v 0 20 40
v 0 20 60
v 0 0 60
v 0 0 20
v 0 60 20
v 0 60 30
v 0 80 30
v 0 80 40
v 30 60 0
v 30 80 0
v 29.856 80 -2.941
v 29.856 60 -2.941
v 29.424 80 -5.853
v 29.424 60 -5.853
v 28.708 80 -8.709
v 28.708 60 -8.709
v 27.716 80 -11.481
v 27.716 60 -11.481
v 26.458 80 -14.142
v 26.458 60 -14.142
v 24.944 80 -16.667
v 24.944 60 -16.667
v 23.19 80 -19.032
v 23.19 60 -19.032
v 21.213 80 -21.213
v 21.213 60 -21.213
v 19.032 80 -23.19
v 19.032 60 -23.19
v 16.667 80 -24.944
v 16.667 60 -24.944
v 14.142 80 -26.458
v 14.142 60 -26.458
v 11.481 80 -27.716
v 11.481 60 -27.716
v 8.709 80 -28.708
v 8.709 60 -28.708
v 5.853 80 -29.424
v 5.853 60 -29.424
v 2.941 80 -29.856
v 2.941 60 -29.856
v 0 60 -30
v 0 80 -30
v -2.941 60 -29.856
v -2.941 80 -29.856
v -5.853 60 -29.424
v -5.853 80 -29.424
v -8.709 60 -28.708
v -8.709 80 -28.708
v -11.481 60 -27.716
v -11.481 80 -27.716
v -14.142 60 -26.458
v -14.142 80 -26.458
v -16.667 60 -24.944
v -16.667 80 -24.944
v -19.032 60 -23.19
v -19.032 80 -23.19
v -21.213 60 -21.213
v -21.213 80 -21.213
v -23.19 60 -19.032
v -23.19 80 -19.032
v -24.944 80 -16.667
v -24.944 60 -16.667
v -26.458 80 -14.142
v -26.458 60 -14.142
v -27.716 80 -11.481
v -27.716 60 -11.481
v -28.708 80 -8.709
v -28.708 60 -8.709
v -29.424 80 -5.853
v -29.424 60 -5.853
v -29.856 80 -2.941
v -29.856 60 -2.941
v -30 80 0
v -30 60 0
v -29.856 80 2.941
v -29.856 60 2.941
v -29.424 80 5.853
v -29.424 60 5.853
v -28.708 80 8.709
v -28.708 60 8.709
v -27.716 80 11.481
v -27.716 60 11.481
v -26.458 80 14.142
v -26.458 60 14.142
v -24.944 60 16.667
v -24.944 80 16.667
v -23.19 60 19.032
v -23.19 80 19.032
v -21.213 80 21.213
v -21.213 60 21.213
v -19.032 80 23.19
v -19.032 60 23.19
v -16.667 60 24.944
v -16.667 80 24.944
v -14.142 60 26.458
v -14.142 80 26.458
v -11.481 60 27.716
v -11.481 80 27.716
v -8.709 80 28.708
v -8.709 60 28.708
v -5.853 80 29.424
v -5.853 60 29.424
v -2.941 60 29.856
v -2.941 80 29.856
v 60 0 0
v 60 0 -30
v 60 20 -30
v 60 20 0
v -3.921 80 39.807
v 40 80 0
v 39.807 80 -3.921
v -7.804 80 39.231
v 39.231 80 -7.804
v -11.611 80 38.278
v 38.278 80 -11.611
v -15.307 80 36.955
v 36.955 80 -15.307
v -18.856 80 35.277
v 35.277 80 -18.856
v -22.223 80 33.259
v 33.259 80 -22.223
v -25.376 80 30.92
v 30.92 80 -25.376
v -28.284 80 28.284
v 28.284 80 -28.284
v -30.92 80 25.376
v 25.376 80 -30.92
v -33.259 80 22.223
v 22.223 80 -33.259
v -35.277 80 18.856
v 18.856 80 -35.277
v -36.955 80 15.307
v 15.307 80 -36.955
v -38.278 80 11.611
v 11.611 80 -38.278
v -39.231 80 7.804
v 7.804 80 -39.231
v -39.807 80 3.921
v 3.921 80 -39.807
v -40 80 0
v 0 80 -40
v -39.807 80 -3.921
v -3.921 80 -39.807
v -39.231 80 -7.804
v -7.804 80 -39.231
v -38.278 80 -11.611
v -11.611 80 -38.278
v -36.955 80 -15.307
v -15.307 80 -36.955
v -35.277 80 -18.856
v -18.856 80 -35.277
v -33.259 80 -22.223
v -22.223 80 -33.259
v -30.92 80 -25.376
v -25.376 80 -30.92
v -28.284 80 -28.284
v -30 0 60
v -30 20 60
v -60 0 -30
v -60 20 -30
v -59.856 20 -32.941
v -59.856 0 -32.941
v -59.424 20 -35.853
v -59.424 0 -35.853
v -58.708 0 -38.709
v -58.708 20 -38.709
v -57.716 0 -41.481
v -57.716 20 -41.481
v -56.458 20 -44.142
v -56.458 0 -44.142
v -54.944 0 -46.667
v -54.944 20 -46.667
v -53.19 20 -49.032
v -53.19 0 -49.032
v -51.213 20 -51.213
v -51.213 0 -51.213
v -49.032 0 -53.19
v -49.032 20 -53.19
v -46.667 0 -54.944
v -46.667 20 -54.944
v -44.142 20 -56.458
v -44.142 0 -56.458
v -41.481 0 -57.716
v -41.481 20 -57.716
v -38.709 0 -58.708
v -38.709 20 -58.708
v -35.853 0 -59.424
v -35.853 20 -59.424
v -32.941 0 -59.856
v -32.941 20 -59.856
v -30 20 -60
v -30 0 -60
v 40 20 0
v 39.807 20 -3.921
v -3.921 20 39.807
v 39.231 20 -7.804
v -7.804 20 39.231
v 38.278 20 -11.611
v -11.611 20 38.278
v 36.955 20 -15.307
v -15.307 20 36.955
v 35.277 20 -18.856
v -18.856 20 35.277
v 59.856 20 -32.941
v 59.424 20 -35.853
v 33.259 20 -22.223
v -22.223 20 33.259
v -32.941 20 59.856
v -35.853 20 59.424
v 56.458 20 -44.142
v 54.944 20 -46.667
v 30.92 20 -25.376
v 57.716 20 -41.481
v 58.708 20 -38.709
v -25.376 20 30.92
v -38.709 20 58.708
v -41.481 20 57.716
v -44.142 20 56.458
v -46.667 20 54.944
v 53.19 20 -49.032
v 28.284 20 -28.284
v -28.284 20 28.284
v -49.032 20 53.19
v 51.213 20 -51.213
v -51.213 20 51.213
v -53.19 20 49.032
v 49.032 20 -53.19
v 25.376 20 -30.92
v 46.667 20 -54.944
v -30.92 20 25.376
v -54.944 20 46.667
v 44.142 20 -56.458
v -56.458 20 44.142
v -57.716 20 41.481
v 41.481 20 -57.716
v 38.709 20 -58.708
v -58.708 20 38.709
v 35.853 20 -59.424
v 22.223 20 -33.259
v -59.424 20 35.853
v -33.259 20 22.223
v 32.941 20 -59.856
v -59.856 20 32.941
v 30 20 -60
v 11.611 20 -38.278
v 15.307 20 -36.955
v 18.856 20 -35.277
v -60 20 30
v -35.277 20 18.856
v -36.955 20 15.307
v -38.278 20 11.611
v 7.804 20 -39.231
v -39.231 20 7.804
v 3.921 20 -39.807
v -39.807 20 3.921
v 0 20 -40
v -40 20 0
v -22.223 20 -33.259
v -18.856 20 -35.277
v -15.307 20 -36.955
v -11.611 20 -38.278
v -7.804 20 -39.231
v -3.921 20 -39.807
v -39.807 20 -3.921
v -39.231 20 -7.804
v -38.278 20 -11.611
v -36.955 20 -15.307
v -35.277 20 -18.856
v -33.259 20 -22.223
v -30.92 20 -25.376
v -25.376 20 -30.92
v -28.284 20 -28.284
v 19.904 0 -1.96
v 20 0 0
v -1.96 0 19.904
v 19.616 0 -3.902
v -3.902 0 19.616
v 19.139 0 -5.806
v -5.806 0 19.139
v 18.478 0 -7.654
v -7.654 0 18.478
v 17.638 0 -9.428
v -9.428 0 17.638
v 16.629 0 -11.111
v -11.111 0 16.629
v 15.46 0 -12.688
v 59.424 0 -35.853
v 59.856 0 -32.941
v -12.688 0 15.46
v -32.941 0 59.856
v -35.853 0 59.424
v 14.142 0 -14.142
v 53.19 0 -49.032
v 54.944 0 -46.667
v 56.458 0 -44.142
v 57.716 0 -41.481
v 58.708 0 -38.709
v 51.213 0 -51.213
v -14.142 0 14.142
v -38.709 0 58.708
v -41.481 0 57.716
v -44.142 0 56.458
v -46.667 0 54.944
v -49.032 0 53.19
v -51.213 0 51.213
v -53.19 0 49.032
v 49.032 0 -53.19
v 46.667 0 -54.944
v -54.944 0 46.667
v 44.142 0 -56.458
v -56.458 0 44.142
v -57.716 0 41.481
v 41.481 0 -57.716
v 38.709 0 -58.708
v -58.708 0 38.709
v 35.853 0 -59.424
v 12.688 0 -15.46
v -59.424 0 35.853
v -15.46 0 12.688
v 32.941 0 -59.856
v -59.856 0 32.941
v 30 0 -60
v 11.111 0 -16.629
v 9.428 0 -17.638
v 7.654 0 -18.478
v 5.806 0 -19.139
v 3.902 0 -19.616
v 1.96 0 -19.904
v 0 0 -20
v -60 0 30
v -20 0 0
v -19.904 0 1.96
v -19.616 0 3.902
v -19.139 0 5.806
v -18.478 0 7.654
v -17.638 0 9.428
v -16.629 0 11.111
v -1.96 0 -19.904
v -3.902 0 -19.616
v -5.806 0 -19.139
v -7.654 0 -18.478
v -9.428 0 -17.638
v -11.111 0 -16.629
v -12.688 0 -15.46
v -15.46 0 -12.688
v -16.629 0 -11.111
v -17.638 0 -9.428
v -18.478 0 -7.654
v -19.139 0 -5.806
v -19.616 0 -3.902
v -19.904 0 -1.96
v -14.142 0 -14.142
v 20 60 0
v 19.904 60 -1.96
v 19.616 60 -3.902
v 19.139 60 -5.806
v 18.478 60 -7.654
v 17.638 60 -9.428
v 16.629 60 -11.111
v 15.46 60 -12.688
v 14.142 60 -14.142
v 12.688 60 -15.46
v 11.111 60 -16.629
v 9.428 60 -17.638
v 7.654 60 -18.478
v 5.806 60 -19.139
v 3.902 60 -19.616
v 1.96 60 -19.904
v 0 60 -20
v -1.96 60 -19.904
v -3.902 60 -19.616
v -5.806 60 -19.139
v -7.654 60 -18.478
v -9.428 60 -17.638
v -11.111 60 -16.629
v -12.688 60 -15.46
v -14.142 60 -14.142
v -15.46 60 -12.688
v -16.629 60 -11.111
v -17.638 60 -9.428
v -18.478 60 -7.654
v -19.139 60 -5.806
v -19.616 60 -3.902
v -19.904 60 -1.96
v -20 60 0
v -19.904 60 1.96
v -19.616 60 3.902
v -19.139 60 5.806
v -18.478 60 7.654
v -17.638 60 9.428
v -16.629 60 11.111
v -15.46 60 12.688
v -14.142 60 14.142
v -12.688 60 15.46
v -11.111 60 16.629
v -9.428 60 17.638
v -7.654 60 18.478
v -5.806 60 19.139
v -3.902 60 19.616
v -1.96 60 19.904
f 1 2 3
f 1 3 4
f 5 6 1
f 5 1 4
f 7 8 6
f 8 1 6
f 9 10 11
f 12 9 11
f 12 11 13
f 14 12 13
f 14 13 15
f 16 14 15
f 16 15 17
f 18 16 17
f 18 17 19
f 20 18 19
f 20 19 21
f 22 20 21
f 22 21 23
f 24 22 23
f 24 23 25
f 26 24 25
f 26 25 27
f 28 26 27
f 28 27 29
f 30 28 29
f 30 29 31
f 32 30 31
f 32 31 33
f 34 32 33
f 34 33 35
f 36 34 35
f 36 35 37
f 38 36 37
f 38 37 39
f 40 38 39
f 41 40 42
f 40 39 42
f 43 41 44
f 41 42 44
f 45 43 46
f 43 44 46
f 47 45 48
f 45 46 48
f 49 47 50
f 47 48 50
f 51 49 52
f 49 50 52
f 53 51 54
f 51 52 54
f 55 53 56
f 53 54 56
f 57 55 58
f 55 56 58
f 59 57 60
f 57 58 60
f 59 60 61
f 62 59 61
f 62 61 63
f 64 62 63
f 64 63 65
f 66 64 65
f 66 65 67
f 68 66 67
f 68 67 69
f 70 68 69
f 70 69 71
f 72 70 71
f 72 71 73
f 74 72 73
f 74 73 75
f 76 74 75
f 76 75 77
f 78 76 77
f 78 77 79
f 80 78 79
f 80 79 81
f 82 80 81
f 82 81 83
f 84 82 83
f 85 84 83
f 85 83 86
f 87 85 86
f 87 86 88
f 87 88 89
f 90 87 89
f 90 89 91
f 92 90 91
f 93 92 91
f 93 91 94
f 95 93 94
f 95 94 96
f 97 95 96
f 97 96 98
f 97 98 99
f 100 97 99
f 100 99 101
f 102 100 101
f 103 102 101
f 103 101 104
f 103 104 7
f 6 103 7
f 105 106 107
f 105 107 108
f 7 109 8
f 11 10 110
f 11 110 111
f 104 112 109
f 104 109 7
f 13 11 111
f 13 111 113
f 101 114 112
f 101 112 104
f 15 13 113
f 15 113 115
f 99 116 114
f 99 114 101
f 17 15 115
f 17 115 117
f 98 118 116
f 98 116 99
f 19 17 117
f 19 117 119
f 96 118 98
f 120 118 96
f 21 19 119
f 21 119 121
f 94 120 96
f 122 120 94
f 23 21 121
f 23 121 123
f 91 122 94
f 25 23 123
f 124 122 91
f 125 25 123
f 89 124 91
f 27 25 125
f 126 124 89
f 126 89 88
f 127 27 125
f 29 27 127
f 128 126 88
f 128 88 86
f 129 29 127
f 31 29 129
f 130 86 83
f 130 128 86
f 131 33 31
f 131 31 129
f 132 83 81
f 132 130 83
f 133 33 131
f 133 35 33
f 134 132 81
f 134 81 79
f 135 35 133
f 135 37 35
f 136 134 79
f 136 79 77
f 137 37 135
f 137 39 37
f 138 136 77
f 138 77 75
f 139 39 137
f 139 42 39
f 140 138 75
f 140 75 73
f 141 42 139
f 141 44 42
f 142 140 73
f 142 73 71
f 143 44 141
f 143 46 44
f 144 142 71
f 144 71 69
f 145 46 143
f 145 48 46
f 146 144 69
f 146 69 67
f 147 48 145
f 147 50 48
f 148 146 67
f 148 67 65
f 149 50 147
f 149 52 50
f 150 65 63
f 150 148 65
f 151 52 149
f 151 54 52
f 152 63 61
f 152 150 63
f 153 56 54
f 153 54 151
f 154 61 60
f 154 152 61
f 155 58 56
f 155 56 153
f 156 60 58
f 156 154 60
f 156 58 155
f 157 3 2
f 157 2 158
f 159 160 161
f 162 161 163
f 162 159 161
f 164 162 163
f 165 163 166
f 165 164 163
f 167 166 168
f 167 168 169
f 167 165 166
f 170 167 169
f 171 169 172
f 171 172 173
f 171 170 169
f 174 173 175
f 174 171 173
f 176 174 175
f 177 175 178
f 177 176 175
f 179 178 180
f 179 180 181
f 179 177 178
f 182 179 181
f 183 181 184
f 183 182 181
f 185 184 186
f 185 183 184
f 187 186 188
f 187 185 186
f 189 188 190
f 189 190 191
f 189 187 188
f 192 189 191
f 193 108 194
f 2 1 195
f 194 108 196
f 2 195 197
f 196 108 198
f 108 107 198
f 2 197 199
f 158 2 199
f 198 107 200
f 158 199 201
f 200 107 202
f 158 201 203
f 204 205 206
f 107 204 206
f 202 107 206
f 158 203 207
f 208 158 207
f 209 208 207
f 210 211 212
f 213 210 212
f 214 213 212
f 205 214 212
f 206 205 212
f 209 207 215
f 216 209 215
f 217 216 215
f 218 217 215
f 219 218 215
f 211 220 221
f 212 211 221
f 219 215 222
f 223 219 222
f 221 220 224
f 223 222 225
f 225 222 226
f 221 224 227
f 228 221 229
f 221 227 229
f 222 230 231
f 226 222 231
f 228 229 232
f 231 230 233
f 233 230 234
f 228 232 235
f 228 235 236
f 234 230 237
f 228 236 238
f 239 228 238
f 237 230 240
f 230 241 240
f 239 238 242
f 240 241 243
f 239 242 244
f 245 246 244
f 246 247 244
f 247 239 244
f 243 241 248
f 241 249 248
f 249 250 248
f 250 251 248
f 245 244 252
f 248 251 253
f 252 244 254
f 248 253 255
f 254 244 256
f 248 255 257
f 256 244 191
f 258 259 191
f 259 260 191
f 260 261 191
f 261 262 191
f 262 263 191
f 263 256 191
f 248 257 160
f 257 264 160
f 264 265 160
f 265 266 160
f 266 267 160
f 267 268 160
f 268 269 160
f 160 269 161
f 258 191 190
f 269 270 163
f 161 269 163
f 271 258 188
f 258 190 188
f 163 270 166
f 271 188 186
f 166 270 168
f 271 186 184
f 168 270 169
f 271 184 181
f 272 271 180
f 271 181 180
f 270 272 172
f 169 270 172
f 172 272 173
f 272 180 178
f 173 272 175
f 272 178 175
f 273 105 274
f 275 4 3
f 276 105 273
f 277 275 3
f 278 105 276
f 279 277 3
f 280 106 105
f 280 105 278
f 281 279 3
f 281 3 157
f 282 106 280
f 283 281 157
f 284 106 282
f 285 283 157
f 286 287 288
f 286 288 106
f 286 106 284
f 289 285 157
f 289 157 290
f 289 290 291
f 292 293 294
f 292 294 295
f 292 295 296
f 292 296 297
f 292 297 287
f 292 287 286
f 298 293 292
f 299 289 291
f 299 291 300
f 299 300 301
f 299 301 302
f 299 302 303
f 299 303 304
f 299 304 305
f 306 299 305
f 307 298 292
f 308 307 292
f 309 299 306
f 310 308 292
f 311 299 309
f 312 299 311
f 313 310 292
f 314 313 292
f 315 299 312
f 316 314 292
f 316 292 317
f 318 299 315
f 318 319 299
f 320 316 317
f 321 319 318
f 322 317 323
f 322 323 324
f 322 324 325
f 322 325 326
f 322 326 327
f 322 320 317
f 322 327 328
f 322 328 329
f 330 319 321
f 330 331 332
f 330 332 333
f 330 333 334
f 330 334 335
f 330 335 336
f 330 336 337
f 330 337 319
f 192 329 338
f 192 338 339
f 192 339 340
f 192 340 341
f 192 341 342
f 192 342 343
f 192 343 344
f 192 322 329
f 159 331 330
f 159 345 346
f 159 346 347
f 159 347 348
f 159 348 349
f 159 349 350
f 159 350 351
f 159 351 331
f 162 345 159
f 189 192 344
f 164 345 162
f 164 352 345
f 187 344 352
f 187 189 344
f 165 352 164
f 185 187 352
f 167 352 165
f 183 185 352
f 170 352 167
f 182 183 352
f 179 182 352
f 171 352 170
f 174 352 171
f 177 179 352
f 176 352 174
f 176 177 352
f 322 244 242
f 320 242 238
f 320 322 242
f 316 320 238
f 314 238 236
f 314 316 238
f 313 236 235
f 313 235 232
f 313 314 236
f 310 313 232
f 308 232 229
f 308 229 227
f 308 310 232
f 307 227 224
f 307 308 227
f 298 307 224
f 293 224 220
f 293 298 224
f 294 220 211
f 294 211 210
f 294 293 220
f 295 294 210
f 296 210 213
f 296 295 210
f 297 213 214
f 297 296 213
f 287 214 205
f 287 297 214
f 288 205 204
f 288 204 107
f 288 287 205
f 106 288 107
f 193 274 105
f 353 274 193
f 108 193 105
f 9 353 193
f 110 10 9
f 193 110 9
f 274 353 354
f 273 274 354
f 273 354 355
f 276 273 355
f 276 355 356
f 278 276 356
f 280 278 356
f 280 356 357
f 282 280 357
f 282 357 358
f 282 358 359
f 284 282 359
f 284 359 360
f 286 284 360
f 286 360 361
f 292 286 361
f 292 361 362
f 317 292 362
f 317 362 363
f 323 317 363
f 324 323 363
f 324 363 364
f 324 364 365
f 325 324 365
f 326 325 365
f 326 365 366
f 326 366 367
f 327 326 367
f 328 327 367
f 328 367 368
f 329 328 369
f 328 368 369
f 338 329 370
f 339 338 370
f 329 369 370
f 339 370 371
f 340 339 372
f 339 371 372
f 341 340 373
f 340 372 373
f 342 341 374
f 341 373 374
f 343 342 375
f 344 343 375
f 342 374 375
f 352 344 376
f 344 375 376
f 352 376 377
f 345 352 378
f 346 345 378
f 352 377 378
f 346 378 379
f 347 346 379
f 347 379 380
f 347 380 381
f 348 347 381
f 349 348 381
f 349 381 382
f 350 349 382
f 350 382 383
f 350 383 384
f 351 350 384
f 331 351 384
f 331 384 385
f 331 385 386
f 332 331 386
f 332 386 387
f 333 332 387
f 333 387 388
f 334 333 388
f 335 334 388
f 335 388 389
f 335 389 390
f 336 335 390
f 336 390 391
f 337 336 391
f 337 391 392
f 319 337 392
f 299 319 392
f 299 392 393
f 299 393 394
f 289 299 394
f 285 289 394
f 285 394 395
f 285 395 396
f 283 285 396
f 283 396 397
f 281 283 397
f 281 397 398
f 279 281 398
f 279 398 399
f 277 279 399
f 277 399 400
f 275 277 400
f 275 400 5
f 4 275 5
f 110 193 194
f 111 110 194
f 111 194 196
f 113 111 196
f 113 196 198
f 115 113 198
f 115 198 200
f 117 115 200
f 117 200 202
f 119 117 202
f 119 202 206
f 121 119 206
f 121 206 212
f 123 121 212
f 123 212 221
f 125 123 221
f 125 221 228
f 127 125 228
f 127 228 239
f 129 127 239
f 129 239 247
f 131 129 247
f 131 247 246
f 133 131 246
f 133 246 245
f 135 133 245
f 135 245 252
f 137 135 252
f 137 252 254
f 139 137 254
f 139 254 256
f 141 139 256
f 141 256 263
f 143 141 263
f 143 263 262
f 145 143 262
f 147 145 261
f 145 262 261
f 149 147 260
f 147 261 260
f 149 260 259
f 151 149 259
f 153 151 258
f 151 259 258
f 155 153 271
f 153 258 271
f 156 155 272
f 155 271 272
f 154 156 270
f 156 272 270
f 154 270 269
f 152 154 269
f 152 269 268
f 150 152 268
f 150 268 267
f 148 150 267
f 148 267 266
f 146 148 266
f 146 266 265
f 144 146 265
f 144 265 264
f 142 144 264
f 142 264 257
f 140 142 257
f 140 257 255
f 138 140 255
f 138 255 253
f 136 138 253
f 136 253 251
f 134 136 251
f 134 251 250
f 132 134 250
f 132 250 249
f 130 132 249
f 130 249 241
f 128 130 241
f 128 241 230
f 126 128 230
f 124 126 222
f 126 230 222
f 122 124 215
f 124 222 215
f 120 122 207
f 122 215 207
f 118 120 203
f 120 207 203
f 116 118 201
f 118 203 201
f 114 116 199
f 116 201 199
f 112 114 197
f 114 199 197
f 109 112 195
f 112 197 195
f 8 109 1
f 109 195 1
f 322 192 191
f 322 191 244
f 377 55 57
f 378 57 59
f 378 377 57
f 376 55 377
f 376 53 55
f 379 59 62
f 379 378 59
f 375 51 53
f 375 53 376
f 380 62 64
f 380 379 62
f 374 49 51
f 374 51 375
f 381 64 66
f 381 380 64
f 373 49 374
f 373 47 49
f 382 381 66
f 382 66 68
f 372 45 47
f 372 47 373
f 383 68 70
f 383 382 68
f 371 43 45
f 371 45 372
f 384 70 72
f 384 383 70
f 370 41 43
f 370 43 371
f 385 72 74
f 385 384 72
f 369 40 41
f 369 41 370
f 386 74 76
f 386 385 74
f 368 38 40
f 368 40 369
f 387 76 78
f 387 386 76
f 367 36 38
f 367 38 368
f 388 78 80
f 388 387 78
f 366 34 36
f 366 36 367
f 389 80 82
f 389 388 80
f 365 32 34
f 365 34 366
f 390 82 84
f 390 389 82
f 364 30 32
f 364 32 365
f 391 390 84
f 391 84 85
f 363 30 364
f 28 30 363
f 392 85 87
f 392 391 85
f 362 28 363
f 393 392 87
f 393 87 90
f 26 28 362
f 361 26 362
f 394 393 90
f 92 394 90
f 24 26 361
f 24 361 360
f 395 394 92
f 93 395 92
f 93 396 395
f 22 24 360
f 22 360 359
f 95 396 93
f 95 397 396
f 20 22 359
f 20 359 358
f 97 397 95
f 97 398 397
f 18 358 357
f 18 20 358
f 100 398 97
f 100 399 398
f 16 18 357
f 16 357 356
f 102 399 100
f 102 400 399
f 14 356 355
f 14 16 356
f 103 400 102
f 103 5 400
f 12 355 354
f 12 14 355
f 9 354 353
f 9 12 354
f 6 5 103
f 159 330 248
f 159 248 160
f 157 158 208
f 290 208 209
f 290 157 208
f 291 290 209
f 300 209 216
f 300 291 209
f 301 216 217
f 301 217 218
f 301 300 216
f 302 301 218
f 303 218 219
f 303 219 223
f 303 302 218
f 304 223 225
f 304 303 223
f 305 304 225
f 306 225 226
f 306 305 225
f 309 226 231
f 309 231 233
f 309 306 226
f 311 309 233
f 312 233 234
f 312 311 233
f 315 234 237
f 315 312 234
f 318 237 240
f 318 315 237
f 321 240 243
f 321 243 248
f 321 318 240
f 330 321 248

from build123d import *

# Parameters (mm, degrees)
SALIENTE_EXTRUIR1_DEPTH = 20
CROQUIS2_R              = 40
SALIENTE_EXTRUIR2_DEPTH = 60
CROQUIS3_R              = 30
CORTAR_EXTRUIR1_DEPTH   = 20
CROQUIS4_R              = 20
CORTAR_EXTRUIR2_DEPTH   = 104.923048454
CROQUIS6_W              = 71.704078793
CROQUIS6_H              = 65.206875147
CORTAR_EXTRUIR4_DEPTH   = 117.619037897


with BuildPart() as part:
    # Croquis1 → Saliente-Extruir1 (new body)
    with BuildSketch(Plane(origin=(0, 0, 0), x_dir=(1, 0, 0), z_dir=(0, 1, 0))):
        with BuildLine():
            Line((-30, 60), (30, 60))
            ThreePointArc((30, 60), (51.213203436, 51.213203436), (60, 30))
            Line((60, 30), (60, -30))
            ThreePointArc((60, -30), (51.213203436, -51.213203436), (30, -60))
            Line((30, -60), (-30, -60))
            ThreePointArc((-30, -60), (-51.213203436, -51.213203436), (-60, -30))
            Line((-60, -30), (-60, 30))
            ThreePointArc((-60, 30), (-51.213203436, 51.213203436), (-30, 60))
        make_face()
    extrude(amount=SALIENTE_EXTRUIR1_DEPTH)

    # Croquis2 → Saliente-Extruir2 (add)
    with BuildSketch(Plane(origin=(0, 20, 0), x_dir=(1, 0, 0), z_dir=(0, 1, 0))):
        with Locations(Location((0, 0, 0), (0, 0, 90))):
            Circle(CROQUIS2_R)
    extrude(amount=SALIENTE_EXTRUIR2_DEPTH)

    # Croquis3 → Cortar-Extruir1 (cut)
    with BuildSketch(Plane(origin=(0, 80, 0), x_dir=(1, 0, 0), z_dir=(0, 1, 0))):
        with Locations(Location((0, 0, 0), (0, 0, 270))):
            Circle(CROQUIS3_R)
    extrude(amount=-CORTAR_EXTRUIR1_DEPTH, mode=Mode.SUBTRACT)

    # Croquis4 → Cortar-Extruir2 (cut, through all)
    with BuildSketch(Plane(origin=(0, 60, 0), x_dir=(1, 0, 0), z_dir=(0, 1, 0))):
        with Locations(Location((0, 0, 0), (0, 0, 270))):
            Circle(CROQUIS4_R)
    extrude(amount=-CORTAR_EXTRUIR2_DEPTH, mode=Mode.SUBTRACT)

    # Croquis6 → Cortar-Extruir4 (cut, through all)
    with BuildSketch(Plane(origin=(0, 80, 0), x_dir=(1, 0, 0), z_dir=(0, 1, 0))):
        with Locations((35.852039397, -32.603437574)):
            Rectangle(CROQUIS6_W, CROQUIS6_H)
    extrude(amount=-CORTAR_EXTRUIR4_DEPTH, mode=Mode.SUBTRACT)


solid = part.part
